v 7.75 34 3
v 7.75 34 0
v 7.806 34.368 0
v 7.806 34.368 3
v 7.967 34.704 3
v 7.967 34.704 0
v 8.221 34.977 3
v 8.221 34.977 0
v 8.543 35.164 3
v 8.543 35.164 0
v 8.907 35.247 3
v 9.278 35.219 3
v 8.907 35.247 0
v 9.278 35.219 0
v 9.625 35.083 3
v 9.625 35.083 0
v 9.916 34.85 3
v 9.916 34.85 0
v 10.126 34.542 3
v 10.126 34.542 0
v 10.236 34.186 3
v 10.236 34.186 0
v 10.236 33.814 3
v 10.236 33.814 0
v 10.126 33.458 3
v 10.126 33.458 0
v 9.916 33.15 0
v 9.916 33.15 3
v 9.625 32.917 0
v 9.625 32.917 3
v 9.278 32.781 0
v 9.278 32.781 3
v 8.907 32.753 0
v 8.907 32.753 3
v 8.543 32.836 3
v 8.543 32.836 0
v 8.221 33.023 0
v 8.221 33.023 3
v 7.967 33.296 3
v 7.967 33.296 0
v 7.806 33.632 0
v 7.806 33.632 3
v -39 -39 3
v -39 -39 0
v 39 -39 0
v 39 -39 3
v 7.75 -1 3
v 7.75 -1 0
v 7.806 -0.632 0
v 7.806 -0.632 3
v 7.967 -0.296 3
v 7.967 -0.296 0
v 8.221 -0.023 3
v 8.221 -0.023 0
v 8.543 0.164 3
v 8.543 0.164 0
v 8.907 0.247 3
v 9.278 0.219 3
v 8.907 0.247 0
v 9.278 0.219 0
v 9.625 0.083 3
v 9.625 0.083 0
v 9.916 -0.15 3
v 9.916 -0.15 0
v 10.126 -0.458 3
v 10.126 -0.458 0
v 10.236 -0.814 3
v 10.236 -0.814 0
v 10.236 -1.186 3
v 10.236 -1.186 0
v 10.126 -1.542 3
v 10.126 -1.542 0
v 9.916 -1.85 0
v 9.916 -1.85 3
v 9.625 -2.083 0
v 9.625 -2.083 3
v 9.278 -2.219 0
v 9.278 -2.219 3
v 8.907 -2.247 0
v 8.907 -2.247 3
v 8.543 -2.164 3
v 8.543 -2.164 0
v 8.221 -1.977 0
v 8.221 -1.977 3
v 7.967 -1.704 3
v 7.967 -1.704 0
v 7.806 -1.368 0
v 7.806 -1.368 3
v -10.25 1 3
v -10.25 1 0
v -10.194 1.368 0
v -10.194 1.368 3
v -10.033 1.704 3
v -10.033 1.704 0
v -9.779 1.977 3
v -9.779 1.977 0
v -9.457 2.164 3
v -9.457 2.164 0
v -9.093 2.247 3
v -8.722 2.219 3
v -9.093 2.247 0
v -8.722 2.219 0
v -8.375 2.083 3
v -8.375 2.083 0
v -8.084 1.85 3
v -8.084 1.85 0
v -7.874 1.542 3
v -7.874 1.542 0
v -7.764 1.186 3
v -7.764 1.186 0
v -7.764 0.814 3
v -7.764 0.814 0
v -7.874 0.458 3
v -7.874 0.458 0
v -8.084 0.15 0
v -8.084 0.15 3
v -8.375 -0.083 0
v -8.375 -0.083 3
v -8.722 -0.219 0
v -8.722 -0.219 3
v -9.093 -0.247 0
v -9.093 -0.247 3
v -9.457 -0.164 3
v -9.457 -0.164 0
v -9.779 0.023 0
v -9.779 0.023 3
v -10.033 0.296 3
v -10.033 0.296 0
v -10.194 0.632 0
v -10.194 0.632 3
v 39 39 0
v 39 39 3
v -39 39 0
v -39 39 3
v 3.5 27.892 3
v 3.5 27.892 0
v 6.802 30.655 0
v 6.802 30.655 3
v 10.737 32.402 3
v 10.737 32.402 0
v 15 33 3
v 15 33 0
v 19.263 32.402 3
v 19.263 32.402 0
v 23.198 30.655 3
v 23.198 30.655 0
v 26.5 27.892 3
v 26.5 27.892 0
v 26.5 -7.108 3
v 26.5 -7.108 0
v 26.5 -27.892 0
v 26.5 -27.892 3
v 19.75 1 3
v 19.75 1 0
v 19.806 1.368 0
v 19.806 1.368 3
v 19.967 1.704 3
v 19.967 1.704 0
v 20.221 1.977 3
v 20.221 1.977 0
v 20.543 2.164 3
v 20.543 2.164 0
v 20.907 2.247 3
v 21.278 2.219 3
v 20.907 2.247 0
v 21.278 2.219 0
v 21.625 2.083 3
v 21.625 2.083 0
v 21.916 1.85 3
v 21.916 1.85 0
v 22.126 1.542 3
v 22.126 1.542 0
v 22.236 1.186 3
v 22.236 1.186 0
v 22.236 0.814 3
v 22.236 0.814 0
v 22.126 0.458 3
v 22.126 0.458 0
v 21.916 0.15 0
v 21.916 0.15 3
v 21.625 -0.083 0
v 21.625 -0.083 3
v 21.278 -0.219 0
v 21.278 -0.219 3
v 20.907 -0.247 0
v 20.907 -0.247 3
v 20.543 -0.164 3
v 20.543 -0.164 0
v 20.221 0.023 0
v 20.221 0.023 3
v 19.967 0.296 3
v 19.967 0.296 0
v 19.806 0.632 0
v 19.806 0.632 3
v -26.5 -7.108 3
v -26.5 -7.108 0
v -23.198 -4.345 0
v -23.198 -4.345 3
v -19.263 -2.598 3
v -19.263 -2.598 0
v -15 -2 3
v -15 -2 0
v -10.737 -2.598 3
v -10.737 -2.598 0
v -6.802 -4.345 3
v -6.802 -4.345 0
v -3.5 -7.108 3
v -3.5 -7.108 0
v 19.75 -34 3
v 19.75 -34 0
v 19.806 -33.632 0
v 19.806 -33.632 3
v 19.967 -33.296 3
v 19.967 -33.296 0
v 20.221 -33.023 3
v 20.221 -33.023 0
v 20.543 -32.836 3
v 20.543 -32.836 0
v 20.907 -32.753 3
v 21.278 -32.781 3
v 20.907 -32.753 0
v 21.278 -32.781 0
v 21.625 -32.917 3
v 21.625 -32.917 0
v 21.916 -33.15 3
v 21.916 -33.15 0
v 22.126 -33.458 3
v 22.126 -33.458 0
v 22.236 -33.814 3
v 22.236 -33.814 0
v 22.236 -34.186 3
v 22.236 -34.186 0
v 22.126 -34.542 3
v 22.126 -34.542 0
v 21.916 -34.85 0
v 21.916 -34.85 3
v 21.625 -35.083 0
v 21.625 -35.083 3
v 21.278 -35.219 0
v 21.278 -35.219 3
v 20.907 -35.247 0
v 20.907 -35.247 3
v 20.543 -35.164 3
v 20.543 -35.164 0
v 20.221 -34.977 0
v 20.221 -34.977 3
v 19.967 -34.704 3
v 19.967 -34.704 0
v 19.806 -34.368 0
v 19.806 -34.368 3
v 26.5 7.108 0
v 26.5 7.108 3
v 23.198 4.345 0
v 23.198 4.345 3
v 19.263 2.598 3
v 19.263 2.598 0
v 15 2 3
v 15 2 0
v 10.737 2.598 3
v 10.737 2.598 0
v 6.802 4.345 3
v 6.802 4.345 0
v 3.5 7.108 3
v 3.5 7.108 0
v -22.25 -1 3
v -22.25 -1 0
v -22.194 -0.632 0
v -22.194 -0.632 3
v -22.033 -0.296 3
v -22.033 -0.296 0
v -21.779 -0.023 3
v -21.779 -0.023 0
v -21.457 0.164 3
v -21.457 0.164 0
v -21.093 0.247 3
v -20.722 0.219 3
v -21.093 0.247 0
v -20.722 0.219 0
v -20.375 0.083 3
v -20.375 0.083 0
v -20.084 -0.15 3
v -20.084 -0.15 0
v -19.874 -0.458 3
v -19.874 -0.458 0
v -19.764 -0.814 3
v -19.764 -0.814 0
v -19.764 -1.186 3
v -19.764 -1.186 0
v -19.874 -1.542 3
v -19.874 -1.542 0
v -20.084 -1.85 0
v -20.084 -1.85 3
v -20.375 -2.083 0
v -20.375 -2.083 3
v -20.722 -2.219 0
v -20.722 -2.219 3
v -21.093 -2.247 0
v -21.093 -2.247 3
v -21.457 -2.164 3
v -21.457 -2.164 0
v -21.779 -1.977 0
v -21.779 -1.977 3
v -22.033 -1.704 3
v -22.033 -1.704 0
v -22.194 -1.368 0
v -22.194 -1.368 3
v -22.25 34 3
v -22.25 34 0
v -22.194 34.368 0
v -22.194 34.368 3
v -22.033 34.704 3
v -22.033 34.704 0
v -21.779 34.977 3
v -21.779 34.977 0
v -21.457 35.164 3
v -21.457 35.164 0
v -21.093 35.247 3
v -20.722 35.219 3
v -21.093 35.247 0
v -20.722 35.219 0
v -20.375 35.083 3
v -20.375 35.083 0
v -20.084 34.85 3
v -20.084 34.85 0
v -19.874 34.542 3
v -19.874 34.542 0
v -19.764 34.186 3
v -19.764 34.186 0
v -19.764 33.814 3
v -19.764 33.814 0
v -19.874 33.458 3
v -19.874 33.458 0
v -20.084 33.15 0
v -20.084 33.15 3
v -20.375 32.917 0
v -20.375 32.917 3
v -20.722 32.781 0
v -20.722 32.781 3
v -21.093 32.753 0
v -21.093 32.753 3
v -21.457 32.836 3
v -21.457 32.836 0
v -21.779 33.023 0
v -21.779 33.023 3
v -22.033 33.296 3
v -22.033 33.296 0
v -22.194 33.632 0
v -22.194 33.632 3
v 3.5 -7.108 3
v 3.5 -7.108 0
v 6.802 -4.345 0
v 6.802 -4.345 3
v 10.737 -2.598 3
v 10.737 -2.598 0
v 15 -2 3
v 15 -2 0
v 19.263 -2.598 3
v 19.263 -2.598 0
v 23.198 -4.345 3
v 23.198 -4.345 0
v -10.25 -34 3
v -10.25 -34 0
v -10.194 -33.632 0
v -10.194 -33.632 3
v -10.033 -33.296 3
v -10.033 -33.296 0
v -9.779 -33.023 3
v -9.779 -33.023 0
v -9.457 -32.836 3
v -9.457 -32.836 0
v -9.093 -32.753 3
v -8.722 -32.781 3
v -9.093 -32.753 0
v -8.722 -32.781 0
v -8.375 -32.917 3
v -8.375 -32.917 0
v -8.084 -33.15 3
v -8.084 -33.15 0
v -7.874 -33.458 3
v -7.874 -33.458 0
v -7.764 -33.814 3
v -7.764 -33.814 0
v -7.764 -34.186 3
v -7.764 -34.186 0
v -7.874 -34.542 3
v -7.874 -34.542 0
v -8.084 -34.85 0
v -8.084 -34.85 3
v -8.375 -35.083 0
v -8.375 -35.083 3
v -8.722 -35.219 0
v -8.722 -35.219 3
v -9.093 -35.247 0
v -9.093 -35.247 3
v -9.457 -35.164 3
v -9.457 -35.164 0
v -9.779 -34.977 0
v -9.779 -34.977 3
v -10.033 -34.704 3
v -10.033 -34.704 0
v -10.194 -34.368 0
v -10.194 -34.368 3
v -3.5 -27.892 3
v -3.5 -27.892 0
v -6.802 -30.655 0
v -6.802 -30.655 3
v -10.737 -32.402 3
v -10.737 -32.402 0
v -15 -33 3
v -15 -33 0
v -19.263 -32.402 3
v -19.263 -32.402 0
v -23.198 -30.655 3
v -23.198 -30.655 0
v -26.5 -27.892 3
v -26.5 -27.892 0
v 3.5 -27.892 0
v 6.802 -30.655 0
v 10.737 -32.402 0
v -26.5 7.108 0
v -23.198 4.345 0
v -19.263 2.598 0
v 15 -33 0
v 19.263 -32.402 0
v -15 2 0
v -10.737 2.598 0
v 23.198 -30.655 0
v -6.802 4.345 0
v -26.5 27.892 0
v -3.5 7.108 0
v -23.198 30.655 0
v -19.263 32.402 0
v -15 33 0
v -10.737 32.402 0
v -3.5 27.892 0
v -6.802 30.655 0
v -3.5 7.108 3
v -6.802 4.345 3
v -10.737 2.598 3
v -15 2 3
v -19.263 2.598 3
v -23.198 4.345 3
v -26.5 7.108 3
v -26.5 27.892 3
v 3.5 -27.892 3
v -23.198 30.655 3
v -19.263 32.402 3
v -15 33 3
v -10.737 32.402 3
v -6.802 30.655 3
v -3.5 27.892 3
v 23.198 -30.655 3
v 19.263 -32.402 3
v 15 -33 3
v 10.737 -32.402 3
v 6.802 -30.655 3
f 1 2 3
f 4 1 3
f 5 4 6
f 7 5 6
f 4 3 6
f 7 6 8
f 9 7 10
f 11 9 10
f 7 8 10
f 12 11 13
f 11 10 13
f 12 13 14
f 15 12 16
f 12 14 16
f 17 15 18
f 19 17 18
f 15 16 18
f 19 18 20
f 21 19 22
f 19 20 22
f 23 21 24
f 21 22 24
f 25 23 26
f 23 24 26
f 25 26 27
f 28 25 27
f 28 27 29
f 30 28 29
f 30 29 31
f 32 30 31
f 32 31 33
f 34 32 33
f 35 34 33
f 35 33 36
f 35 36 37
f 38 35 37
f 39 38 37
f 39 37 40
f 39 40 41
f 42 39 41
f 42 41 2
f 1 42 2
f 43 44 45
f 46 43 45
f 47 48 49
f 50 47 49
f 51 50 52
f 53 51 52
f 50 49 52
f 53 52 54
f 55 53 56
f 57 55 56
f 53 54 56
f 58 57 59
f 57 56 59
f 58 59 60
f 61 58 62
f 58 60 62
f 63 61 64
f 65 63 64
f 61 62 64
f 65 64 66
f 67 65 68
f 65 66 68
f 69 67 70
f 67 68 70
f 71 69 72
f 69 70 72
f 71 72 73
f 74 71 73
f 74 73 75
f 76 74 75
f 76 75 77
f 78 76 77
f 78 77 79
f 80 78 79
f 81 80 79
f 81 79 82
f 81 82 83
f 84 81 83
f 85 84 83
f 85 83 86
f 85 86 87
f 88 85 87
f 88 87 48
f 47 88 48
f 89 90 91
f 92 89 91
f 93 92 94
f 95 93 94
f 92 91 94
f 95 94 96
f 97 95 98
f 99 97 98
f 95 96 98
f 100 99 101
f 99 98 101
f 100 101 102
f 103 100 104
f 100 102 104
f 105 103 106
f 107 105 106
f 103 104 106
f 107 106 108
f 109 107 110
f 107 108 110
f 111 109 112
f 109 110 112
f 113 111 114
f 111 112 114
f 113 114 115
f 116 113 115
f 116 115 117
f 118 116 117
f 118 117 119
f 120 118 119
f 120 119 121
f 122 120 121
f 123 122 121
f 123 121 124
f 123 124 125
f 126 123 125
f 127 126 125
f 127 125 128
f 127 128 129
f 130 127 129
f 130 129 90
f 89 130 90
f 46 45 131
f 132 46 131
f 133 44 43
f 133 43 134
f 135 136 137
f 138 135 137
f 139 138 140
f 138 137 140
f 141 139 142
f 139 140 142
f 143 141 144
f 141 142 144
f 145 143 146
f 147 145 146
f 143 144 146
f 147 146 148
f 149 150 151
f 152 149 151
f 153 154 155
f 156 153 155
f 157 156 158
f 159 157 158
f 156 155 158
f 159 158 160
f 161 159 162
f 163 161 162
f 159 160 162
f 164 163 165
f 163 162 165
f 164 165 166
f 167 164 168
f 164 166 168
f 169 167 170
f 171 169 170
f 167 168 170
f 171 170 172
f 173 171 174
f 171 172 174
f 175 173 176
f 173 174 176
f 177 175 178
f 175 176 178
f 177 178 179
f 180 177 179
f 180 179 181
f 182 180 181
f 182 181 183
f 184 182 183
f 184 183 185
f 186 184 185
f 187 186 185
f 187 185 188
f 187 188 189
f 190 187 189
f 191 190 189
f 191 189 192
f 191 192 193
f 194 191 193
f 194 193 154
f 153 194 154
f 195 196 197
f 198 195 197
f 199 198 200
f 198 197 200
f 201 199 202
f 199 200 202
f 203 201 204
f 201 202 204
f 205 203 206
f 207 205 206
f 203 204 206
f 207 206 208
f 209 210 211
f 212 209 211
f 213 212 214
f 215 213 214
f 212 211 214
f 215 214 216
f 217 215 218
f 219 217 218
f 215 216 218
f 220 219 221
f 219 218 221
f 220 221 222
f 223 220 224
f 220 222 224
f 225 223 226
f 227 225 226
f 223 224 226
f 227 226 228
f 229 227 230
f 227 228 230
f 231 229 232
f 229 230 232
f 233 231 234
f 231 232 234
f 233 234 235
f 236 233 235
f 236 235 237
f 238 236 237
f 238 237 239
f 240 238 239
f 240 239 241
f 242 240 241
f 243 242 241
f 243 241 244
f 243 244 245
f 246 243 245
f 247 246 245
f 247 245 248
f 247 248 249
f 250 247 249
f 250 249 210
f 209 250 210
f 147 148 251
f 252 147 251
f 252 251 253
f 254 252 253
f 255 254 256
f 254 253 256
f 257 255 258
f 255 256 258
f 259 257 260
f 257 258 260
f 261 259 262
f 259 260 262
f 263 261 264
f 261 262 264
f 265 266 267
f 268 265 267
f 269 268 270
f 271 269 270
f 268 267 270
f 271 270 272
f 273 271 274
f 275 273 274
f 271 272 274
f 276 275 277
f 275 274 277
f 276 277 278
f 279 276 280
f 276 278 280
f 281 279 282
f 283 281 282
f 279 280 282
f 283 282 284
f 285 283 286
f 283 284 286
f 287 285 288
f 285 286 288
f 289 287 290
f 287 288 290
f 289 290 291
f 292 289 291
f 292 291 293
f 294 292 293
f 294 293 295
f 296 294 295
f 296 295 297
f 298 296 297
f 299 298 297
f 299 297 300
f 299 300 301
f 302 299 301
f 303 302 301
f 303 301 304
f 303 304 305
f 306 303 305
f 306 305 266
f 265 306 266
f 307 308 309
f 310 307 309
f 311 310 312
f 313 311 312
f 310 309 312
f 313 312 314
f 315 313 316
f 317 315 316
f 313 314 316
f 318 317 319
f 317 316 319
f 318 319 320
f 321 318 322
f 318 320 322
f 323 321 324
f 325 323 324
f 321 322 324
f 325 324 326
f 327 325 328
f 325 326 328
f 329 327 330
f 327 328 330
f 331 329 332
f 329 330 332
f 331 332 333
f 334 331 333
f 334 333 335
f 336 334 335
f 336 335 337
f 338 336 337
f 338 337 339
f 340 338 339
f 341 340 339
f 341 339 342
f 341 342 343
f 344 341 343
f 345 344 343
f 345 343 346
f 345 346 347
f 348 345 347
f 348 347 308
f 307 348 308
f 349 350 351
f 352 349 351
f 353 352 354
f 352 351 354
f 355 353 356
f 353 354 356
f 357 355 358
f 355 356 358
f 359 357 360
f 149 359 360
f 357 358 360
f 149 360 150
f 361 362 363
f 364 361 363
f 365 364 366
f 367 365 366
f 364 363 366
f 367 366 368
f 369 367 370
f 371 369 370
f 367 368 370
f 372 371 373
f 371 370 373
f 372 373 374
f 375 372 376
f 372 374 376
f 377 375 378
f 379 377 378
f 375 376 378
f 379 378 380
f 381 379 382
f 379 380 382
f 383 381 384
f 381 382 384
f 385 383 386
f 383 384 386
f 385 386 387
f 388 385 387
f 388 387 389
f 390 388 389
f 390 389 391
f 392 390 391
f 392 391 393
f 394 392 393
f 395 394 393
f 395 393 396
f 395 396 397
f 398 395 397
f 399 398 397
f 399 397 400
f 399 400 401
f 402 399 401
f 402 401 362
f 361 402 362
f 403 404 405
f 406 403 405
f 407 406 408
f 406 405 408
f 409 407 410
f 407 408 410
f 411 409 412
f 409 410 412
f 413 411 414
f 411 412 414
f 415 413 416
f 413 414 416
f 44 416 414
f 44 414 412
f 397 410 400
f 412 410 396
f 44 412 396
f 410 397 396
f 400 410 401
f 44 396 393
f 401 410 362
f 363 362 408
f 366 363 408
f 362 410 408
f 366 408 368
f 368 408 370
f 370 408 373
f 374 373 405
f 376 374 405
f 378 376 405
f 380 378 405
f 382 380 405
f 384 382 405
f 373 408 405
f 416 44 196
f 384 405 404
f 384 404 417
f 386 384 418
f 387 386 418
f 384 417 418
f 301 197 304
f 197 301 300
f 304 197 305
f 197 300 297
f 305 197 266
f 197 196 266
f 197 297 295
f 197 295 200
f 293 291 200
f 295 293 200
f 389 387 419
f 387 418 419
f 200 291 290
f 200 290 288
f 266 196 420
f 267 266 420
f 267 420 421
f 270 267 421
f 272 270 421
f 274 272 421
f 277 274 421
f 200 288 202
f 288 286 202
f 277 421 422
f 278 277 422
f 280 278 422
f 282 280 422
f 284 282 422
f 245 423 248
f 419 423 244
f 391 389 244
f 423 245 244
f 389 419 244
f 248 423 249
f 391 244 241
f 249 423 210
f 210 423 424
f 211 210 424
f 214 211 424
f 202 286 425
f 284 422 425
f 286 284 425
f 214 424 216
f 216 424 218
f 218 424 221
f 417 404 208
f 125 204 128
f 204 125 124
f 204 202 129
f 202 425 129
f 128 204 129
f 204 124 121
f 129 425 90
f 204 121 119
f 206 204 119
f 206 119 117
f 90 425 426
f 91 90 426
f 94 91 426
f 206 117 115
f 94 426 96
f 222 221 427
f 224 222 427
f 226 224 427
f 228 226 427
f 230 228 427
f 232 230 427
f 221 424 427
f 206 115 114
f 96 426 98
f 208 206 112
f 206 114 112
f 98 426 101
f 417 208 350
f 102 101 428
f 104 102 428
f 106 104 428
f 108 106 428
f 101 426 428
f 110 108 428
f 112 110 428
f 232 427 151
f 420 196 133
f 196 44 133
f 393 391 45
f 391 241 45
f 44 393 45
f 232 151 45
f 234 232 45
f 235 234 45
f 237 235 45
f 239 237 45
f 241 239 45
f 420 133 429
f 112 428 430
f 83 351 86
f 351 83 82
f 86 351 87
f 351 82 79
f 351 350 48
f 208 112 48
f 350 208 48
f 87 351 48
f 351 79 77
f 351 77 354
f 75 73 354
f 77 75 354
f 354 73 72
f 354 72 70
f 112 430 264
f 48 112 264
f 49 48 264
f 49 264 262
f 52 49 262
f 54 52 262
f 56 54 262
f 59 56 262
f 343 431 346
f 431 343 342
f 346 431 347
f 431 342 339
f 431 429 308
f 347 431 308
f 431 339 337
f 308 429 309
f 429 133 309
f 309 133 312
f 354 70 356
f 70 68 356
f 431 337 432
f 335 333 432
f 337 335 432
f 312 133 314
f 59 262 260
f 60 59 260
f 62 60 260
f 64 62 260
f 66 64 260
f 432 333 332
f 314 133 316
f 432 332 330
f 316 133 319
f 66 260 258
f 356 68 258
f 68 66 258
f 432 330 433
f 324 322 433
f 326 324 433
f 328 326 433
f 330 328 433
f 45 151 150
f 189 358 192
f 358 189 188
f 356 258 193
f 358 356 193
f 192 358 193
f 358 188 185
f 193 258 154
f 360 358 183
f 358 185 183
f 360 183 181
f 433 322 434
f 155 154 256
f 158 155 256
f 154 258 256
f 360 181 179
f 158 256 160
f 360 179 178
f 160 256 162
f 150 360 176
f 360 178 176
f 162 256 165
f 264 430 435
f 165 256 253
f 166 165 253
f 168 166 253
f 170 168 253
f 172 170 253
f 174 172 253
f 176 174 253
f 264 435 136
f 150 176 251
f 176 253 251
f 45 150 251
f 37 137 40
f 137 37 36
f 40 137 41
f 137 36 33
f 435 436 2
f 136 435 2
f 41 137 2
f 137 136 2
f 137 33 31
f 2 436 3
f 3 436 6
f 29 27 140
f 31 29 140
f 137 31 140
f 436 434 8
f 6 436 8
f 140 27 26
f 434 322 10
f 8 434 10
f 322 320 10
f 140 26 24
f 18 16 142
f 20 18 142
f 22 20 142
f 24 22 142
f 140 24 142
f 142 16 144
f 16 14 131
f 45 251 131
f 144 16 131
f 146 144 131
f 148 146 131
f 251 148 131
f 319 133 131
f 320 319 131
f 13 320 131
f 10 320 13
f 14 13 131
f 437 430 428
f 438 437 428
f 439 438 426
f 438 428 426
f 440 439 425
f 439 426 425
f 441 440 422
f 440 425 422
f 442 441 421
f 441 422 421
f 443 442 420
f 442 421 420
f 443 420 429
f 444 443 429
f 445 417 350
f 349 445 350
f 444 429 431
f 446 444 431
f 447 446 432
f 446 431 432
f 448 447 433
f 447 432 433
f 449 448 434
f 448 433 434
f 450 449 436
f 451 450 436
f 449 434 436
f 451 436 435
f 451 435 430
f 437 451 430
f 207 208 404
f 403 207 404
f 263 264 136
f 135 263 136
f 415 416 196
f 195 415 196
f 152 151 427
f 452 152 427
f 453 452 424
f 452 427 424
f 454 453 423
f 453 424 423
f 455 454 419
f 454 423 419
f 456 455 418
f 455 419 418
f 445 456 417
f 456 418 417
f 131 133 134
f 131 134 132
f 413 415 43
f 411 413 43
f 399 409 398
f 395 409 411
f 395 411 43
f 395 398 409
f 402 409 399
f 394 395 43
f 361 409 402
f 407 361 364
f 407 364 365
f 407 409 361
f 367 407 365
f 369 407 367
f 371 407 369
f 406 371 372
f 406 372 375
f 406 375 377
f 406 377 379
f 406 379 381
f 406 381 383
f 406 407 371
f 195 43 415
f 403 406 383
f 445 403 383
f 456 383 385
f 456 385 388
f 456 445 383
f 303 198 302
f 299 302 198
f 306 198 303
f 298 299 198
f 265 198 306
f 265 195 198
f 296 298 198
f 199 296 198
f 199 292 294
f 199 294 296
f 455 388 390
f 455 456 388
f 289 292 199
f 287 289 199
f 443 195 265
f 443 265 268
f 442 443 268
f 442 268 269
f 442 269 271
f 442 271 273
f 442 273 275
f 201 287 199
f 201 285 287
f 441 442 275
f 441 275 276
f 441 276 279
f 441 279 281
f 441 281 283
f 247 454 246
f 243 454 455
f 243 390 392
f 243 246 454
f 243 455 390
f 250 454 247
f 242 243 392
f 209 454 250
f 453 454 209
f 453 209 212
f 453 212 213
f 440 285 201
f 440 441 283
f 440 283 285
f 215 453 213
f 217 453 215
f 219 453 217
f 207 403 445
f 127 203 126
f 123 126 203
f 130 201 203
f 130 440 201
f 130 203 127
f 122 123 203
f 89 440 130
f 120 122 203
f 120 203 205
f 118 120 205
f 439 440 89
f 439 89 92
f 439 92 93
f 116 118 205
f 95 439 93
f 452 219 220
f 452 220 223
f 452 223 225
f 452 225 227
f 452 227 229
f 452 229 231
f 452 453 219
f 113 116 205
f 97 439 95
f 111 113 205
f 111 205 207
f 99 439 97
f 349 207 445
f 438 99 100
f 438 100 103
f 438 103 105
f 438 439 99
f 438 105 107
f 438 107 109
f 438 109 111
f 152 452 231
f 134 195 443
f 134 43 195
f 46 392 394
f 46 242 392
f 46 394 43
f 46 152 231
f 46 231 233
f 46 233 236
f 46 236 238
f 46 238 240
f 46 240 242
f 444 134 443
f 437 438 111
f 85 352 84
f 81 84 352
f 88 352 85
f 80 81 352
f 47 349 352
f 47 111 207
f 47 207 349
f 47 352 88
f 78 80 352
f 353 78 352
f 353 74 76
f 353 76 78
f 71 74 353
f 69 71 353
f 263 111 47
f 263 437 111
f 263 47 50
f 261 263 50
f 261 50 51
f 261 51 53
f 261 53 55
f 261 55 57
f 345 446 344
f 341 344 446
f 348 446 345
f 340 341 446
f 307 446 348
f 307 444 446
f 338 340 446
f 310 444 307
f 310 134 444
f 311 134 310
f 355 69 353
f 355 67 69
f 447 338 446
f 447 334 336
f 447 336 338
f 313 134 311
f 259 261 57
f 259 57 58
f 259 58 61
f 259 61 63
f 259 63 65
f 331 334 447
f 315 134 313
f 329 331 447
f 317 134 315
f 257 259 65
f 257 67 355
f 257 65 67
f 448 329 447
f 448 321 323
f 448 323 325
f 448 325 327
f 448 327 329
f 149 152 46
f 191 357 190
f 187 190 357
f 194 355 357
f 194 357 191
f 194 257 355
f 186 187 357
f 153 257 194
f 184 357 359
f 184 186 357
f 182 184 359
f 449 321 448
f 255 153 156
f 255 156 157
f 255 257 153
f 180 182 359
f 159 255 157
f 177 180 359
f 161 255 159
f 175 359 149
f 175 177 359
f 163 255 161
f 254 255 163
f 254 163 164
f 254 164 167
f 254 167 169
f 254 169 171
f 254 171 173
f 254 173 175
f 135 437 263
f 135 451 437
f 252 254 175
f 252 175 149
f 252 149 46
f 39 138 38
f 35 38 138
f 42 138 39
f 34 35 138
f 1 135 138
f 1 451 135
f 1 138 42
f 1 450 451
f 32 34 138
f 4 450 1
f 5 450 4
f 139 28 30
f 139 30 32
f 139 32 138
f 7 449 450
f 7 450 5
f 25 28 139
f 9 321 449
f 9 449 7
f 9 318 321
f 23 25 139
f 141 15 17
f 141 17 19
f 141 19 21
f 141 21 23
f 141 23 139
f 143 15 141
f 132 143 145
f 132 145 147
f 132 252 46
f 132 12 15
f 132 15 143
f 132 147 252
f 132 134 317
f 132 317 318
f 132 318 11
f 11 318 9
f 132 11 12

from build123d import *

# Parameters (mm, degrees)
SKETCH1_W            = 78
SKETCH1_H            = 78
BOSS_EXTRUDE1_DEPTH  = 3
CUT_EXTRUDE1_DEPTH   = 56.235857919
SKETCH3_R            = 1.25
CUT_EXTRUDE2_DEPTH   = 56.235857919
LPATTERN1_COUNT      = 2
LPATTERN1_PITCH      = 30
LPATTERN1_COUNT_DIR2 = 2
LPATTERN1_PITCH_DIR2 = 35


with BuildPart() as part:
    # Sketch1 → Boss-Extrude1 (new body)
    with BuildSketch(Plane.XY):
        Rectangle(SKETCH1_W, SKETCH1_H)
    extrude(amount=BOSS_EXTRUDE1_DEPTH)

    # Sketch2 → Cut-Extrude1 (cut, through all)
    with BuildSketch(Plane(origin=(0, 0, 0), x_dir=(-1, 0, 0), z_dir=(0, 0, -1))):
        with BuildLine():
            Line((-26.5, 27.892304845), (-26.5, 7.107695155))
            ThreePointArc((-26.5, 7.107695155), (-15, 2), (-3.5, 7.107695155))
            Line((-3.5, 7.107695155), (-3.5, 27.892304845))
            ThreePointArc((-3.5, 27.892304845), (-15, 33), (-26.5, 27.892304845))
        make_face()
    cut_extrude1 = extrude(amount=-CUT_EXTRUDE1_DEPTH, mode=Mode.SUBTRACT)

    # Sketch3 → Cut-Extrude2 (cut, through all)
    with BuildSketch(Plane(origin=(0, 0, 0), x_dir=(-1, 0, 0), z_dir=(0, 0, -1))):
        with Locations((-21, 1)):
            Circle(SKETCH3_R)
        with Locations((-9, 34)):
            Circle(SKETCH3_R)
    cut_extrude2 = extrude(amount=-CUT_EXTRUDE2_DEPTH, mode=Mode.SUBTRACT)

    # LPattern1: Cut-Extrude1, Cut-Extrude2 2 × 2
    with Locations(*[(-i * LPATTERN1_PITCH, -j * LPATTERN1_PITCH_DIR2, 0) for i in range(LPATTERN1_COUNT) for j in range(LPATTERN1_COUNT_DIR2) if (i, j) != (0, 0)]):
        add(cut_extrude1, mode=Mode.SUBTRACT)
        add(cut_extrude2, mode=Mode.SUBTRACT)


solid = part.part
